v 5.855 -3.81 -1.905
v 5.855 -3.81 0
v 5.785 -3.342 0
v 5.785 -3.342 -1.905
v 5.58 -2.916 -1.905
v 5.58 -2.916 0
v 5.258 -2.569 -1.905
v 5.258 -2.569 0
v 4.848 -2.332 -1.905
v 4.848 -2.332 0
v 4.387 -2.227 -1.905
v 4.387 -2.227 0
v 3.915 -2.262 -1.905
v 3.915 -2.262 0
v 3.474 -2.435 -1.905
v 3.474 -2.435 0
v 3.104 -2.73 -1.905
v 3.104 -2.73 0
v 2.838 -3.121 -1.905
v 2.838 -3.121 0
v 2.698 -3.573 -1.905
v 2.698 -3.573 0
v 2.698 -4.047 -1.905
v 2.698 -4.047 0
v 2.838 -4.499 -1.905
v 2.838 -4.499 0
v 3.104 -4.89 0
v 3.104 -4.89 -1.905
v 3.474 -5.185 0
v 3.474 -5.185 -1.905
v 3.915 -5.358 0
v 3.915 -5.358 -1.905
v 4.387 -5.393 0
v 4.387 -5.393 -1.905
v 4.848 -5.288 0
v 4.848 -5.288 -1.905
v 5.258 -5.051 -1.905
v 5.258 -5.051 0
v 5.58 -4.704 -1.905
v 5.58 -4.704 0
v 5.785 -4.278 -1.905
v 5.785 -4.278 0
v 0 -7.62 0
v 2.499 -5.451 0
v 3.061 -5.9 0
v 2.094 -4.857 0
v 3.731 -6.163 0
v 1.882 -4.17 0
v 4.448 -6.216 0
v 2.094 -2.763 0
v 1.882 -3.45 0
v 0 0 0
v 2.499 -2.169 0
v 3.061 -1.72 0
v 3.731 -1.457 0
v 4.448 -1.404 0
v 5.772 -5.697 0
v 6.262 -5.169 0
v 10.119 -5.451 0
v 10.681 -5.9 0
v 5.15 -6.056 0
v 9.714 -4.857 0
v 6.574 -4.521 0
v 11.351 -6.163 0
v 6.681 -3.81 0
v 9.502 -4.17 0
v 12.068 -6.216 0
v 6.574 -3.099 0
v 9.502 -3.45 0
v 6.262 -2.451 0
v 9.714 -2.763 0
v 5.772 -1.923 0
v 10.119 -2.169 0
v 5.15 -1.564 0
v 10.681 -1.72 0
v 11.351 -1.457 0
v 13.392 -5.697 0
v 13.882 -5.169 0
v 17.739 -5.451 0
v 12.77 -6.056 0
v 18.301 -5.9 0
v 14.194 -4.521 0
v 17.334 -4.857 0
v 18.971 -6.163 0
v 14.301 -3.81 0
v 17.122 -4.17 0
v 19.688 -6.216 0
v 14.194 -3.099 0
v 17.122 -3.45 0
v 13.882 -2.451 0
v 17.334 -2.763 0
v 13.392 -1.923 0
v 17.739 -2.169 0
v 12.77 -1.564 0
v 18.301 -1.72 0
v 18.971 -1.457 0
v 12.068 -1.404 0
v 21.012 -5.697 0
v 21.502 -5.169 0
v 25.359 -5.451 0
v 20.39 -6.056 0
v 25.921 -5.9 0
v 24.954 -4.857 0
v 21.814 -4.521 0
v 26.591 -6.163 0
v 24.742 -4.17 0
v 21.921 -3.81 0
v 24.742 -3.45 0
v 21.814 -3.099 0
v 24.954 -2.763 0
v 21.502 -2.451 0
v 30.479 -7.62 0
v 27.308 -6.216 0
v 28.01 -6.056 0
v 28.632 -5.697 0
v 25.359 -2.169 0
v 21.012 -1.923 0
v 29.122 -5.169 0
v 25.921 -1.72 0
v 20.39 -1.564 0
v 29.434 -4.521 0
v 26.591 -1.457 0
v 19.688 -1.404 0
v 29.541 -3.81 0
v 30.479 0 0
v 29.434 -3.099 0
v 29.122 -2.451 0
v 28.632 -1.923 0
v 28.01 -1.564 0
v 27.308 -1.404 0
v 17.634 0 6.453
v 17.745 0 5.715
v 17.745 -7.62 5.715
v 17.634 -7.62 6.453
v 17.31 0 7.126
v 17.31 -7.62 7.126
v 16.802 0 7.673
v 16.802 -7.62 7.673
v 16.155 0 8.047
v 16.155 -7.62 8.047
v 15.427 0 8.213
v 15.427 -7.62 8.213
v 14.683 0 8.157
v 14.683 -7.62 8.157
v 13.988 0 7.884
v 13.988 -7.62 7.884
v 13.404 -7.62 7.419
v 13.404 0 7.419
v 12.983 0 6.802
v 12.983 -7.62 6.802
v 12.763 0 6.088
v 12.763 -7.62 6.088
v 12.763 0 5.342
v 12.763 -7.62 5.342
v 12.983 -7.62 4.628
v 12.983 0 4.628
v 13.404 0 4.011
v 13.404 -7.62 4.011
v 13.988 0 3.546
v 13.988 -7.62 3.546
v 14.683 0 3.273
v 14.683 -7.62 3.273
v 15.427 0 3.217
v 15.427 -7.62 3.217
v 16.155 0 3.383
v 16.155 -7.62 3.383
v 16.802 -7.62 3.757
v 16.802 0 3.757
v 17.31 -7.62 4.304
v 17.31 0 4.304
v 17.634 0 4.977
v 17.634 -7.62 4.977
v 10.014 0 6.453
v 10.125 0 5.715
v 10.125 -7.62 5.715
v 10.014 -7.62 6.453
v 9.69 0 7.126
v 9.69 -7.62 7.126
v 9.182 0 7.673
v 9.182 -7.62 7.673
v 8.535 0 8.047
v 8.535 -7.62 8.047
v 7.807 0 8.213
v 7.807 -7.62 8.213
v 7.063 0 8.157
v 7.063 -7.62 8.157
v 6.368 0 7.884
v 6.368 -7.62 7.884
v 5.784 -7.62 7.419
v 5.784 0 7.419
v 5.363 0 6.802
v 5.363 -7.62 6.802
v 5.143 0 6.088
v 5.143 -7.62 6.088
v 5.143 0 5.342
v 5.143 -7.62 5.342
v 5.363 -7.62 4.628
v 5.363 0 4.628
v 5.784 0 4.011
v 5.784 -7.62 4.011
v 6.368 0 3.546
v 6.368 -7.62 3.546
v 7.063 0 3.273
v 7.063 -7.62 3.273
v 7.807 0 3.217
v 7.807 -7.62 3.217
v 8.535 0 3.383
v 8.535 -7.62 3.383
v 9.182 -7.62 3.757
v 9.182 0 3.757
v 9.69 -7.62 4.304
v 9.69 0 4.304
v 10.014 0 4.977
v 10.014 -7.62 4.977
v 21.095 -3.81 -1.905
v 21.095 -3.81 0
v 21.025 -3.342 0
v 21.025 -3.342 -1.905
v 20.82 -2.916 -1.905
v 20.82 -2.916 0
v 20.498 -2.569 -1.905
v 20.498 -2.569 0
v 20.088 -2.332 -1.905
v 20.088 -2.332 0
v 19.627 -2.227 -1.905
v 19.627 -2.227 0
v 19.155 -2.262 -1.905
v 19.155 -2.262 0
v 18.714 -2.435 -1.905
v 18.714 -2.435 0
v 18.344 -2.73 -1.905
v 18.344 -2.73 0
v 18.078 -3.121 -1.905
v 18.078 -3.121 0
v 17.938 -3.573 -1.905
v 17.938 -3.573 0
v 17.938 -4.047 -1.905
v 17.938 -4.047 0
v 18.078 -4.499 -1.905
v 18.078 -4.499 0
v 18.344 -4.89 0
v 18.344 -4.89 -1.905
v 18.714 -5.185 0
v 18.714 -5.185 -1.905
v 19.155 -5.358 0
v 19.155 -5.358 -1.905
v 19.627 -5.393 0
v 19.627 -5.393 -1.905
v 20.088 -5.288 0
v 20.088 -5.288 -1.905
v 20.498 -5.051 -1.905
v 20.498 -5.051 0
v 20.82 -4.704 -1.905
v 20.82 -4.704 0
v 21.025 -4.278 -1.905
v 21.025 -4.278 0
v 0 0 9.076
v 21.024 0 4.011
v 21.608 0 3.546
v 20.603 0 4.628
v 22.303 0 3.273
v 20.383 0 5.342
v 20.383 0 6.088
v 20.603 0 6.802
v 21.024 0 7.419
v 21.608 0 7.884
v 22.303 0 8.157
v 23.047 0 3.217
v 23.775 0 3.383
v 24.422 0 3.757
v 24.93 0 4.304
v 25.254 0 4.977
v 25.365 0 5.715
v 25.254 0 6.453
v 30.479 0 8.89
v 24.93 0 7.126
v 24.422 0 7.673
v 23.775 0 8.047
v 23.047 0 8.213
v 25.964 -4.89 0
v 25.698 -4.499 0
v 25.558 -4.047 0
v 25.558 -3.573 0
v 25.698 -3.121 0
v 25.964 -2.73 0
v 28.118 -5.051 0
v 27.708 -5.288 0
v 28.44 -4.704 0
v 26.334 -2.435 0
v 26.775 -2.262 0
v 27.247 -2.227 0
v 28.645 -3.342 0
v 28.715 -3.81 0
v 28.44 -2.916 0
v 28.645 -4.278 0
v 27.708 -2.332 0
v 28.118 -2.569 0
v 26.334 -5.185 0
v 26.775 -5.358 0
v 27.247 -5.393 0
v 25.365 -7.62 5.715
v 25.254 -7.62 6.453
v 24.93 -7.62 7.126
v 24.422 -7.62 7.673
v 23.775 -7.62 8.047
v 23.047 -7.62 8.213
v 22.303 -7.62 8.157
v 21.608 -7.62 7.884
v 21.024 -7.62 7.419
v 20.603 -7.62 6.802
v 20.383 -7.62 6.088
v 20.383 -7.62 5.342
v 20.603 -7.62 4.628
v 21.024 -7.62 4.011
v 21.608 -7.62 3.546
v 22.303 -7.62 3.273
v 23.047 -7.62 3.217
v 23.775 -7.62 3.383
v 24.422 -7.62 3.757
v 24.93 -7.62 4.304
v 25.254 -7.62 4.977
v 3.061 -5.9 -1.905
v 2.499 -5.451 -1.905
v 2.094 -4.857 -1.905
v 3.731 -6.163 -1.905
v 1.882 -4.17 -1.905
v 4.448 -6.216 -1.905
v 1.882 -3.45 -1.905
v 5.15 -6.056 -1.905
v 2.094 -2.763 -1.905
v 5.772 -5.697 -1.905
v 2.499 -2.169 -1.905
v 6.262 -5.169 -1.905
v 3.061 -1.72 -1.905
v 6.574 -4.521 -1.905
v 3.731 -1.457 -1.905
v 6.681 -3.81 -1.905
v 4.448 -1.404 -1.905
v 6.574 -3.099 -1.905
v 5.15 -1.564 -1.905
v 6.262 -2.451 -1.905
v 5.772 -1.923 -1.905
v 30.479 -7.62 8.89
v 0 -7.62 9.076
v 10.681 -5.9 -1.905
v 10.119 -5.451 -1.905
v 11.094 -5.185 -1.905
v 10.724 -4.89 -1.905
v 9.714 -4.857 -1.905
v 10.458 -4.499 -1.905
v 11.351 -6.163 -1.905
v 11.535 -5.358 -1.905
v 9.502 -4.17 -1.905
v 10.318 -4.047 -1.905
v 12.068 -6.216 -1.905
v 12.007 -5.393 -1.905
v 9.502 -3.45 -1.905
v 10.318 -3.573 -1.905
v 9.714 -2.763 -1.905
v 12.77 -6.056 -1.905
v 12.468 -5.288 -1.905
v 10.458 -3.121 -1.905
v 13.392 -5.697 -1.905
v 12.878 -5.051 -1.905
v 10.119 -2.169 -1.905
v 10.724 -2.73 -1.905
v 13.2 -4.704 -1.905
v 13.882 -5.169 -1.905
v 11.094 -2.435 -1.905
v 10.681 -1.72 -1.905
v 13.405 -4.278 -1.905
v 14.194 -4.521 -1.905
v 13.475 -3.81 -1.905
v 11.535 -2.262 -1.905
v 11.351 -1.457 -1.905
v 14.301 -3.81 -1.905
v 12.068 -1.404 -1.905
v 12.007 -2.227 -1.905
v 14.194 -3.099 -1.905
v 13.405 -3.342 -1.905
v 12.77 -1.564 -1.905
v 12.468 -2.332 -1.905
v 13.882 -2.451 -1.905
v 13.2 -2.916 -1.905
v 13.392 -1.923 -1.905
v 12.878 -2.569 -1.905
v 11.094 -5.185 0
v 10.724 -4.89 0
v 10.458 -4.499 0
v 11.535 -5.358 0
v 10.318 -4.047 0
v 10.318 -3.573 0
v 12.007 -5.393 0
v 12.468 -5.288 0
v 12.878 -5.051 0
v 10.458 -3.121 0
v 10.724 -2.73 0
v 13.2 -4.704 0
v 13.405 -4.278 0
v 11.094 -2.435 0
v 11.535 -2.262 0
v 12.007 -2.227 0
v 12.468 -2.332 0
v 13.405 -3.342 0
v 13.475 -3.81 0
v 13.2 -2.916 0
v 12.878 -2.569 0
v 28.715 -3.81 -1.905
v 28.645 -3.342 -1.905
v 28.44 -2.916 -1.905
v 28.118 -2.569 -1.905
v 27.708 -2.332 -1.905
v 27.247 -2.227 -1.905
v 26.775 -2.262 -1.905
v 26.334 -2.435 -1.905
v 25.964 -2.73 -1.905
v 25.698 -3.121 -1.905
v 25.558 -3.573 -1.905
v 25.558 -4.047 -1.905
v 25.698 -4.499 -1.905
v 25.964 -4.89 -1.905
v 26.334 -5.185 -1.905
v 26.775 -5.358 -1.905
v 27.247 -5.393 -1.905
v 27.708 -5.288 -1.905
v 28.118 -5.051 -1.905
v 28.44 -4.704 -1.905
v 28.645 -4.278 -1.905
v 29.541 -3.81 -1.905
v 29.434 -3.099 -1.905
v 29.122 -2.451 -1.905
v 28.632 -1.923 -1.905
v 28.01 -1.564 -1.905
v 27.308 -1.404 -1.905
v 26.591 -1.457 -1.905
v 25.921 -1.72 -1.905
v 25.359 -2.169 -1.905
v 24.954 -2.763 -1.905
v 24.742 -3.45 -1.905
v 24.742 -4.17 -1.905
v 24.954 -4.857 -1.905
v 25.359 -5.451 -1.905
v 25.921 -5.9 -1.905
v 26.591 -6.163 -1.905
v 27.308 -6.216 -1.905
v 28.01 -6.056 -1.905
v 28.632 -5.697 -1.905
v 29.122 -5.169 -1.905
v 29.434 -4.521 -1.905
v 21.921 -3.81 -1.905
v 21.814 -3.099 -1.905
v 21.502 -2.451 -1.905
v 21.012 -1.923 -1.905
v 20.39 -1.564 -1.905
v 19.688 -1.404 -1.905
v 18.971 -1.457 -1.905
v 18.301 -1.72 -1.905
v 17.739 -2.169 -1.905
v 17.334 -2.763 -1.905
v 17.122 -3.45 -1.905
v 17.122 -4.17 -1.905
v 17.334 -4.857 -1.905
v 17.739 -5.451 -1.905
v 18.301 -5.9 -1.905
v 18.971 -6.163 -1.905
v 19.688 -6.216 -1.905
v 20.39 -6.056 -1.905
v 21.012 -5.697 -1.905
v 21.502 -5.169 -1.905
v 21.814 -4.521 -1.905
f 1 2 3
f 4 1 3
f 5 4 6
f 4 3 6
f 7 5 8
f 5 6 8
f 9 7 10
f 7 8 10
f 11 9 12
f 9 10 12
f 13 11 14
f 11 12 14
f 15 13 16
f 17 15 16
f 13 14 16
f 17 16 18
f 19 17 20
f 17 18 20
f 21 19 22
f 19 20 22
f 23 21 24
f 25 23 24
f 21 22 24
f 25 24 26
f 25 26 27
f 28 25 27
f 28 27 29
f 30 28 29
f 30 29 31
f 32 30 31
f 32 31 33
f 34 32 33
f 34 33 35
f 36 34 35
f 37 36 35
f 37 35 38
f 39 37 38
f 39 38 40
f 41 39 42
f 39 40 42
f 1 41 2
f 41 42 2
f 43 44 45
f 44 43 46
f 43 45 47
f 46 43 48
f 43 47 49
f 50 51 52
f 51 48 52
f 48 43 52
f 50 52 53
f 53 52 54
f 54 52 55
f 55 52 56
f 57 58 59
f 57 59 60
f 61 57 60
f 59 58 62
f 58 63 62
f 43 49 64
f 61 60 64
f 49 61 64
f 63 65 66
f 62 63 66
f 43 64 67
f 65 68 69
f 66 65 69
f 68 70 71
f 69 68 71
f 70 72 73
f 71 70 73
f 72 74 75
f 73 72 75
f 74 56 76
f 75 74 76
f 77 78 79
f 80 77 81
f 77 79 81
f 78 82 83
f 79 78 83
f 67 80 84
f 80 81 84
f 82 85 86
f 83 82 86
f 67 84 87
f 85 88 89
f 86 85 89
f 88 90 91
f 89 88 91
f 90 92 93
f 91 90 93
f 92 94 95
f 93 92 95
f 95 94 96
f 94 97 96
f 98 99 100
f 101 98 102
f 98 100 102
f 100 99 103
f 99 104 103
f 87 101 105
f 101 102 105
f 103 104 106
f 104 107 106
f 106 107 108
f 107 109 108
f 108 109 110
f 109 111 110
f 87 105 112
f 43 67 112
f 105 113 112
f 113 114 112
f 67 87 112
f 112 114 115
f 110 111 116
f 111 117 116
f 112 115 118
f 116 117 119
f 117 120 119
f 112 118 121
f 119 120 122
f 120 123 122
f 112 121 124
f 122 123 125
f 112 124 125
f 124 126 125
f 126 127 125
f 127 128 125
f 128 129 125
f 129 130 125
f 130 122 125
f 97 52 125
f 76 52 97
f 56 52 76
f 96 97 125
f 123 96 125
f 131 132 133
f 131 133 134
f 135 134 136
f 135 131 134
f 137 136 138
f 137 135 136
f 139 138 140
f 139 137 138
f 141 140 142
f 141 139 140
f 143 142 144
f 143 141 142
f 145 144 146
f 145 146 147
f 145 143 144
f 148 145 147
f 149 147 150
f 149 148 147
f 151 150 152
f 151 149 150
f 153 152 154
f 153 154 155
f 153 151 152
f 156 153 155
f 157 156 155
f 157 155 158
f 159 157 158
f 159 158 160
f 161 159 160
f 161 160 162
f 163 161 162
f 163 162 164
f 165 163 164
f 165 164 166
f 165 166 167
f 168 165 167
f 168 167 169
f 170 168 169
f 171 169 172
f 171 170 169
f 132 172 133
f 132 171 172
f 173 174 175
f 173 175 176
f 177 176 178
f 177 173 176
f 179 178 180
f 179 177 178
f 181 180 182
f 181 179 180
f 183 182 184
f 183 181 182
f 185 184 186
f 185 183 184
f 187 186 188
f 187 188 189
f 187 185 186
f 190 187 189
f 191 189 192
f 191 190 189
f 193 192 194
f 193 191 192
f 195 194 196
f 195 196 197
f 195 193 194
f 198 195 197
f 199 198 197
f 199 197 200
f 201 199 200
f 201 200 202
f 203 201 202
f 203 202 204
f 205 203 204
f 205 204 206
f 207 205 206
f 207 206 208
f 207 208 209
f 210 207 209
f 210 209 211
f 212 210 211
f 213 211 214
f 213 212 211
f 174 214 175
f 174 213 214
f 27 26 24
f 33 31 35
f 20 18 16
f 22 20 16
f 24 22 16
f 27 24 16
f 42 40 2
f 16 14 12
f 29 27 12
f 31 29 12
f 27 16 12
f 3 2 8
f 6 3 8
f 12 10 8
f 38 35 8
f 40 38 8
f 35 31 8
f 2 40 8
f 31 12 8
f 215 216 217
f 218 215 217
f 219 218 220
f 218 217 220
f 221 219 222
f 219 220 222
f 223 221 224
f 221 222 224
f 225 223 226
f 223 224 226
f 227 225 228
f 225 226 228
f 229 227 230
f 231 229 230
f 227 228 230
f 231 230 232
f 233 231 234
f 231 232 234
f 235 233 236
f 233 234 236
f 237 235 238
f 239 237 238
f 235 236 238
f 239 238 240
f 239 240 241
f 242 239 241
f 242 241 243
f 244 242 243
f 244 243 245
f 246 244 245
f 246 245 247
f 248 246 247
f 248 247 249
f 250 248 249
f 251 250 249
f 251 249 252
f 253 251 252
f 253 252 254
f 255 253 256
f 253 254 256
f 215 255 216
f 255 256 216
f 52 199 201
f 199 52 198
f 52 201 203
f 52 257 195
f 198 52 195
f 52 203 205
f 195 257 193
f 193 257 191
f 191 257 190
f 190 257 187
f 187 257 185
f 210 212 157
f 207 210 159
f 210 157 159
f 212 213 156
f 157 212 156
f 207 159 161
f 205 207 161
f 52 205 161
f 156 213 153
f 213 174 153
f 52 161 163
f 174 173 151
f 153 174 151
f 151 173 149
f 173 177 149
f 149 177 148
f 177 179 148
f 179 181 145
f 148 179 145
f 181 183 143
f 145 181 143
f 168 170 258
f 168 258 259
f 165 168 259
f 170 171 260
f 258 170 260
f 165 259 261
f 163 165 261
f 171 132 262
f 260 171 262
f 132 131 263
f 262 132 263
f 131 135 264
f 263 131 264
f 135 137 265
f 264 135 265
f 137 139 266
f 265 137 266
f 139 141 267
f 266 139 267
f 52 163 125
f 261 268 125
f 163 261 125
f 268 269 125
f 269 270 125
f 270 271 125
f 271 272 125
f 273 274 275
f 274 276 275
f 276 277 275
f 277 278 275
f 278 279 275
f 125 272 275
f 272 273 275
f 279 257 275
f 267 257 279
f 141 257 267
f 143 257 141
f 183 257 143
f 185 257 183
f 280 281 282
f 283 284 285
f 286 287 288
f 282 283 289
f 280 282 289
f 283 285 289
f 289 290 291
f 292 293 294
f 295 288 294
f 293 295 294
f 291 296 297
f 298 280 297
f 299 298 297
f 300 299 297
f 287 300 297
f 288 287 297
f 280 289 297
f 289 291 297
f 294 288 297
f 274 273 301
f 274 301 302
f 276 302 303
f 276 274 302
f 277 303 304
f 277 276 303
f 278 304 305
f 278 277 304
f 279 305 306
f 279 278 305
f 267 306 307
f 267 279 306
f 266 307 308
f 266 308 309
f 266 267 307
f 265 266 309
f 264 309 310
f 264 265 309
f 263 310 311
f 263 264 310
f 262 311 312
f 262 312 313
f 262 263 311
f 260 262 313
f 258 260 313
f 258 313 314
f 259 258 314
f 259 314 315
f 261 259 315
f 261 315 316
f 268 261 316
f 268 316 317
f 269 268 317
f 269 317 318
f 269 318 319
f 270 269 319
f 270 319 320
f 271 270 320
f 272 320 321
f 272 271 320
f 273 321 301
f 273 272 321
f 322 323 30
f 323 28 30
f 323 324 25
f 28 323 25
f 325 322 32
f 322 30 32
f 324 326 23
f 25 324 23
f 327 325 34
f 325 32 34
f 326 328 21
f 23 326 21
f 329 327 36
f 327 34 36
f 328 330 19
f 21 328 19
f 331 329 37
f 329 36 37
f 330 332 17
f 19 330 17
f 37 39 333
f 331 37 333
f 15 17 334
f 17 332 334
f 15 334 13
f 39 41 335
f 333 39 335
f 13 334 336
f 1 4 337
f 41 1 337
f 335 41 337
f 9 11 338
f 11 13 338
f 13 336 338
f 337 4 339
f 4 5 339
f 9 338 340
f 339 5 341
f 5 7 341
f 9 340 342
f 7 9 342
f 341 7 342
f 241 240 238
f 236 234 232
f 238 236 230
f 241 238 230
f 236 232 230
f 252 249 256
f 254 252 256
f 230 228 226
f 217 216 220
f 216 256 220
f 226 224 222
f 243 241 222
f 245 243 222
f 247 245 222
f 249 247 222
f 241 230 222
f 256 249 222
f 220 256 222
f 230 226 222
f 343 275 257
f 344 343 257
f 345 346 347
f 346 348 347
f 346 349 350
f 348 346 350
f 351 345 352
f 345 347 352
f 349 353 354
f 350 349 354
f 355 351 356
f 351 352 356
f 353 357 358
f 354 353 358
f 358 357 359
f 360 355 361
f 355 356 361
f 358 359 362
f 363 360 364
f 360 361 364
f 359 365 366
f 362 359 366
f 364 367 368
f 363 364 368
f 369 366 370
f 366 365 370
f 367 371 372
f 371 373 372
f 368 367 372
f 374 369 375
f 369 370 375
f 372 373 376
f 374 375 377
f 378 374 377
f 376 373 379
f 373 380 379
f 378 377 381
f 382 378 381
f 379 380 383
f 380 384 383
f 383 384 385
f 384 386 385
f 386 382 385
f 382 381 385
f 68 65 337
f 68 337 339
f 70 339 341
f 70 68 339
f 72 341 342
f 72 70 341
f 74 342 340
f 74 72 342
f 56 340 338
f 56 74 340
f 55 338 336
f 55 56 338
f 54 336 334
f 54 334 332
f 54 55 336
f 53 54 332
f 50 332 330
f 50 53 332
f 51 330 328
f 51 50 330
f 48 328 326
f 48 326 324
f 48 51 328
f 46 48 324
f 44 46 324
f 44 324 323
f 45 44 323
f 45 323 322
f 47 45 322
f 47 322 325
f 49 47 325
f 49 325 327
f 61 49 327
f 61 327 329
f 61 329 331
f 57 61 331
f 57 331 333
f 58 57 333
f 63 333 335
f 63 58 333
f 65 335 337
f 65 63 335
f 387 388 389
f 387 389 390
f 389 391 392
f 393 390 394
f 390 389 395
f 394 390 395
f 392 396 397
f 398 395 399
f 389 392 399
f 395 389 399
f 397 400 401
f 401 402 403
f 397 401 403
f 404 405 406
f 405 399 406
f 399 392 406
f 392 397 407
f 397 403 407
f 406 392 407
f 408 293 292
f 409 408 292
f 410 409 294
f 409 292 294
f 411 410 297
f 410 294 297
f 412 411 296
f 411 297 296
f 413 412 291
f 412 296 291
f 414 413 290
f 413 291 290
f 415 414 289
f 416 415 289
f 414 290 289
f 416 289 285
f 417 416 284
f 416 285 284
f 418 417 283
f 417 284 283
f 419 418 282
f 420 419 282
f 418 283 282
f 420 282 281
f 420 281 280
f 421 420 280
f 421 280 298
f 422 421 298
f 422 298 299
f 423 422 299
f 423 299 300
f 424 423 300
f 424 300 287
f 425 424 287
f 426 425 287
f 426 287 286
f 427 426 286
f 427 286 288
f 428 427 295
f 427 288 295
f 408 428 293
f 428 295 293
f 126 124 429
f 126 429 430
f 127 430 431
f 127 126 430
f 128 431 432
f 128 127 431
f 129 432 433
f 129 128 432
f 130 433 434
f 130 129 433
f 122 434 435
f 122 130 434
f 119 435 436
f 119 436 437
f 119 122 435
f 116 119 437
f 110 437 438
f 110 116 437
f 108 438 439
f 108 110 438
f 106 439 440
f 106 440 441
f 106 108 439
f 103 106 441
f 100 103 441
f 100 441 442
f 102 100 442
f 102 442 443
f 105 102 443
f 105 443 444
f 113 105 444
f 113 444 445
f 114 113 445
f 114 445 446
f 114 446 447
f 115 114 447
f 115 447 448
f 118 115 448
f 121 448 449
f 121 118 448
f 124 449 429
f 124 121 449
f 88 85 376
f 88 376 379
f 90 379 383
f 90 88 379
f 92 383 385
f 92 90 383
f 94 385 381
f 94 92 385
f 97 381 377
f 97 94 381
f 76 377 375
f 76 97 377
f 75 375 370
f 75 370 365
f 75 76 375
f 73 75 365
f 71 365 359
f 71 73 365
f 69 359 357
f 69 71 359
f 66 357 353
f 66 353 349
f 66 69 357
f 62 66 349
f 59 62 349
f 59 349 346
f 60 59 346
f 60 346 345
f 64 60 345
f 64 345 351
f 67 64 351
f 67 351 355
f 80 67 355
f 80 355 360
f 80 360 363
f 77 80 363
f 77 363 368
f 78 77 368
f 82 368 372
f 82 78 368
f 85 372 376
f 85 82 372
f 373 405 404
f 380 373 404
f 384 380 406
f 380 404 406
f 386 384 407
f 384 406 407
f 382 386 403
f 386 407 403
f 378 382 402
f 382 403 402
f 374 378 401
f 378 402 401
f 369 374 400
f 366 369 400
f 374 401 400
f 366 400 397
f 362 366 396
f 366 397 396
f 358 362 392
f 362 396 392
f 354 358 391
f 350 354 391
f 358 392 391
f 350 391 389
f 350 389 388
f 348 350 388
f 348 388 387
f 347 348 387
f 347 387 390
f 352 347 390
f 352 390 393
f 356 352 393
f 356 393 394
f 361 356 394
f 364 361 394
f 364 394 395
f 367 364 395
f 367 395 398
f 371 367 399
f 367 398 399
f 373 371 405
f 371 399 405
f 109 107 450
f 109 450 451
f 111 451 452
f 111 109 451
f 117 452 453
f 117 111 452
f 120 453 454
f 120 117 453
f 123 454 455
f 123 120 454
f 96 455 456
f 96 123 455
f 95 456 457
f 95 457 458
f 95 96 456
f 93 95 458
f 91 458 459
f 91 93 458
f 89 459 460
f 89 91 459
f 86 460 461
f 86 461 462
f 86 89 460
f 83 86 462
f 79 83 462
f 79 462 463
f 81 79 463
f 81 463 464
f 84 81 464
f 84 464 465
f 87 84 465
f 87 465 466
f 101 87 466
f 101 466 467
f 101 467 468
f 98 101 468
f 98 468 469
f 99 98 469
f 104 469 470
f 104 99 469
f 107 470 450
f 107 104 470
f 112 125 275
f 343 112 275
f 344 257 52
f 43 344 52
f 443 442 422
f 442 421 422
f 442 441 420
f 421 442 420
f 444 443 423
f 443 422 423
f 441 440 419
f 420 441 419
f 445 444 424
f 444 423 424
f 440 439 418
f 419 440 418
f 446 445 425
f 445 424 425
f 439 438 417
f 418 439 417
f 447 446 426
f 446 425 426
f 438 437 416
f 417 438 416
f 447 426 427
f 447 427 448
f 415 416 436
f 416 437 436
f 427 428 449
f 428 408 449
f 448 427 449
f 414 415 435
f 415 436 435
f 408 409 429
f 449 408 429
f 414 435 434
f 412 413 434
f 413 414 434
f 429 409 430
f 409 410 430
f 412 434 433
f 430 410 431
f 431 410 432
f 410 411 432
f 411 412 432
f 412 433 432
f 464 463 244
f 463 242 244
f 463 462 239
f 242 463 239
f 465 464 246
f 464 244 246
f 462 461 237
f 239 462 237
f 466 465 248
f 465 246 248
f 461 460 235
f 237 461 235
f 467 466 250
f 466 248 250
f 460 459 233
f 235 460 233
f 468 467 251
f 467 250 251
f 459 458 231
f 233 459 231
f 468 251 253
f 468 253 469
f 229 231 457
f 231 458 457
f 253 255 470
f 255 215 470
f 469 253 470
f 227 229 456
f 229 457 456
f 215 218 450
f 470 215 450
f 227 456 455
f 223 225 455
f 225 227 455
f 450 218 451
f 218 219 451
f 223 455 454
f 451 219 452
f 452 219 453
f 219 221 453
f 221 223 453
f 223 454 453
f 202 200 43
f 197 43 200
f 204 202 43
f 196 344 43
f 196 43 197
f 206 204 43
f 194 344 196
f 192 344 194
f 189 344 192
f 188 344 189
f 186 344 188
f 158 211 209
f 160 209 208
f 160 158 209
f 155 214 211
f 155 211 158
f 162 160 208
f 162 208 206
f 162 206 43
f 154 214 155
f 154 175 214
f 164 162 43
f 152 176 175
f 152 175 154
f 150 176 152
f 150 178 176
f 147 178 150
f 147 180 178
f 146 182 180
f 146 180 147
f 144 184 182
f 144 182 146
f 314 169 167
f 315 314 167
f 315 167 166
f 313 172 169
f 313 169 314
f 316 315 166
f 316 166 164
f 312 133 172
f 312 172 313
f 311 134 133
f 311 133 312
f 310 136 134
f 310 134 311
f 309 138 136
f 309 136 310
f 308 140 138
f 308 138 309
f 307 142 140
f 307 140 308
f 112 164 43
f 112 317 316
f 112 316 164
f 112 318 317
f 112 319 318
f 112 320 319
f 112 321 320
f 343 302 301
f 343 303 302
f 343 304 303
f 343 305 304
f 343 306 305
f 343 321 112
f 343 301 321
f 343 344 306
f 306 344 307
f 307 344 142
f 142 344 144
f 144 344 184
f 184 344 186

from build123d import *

# Parameters (mm, degrees)
F0_R     = 2.919268
F0_R_2   = 2.504925
F1_DEPTH = 7.62
F2_R     = 2.413
F2_R_2   = 1.5875
F3_DEPTH = 1.905


with BuildPart() as f1:
    # F0 (on Front) → F1 (new body)
    with BuildSketch(Plane.XZ):
        Polygon((30.479431, 8.89), (0, 9.076191), (0, 0), (30.479431, 0), align=None)
        with Locations((7.62, 5.715)):
            Circle(F0_R, mode=Mode.SUBTRACT)
        with Locations((15.24, 5.715)):
            Circle(F0_R, mode=Mode.SUBTRACT)
        with Locations((22.86, 5.715)):
            Circle(F0_R, mode=Mode.SUBTRACT)
        with Locations((15.24, 5.715)):
            Circle(F0_R)
        with Locations((15.24, 5.715)):
            Circle(F0_R_2, mode=Mode.SUBTRACT)
        with Locations((22.86, 5.715)):
            Circle(F0_R)
        with Locations((22.86, 5.715)):
            Circle(F0_R_2, mode=Mode.SUBTRACT)
        with Locations((7.62, 5.715)):
            Circle(F0_R)
        with Locations((7.62, 5.715)):
            Circle(F0_R_2, mode=Mode.SUBTRACT)
    extrude(amount=F1_DEPTH)

    # F2 (on Top) → F3 (join)
    with BuildSketch(Plane.XY):
        with Locations((4.267945, -3.81)):
            Circle(F2_R)
        with Locations((4.267945, -3.81)):
            Circle(F2_R_2, mode=Mode.SUBTRACT)
        with Locations((11.887945, -3.81)):
            Circle(F2_R)
        with Locations((11.887945, -3.81)):
            Circle(F2_R_2, mode=Mode.SUBTRACT)
        with Locations((19.507945, -3.81)):
            Circle(F2_R)
        with Locations((19.507945, -3.81)):
            Circle(F2_R_2, mode=Mode.SUBTRACT)
        with Locations((27.127945, -3.81)):
            Circle(F2_R)
        with Locations((27.127945, -3.81)):
            Circle(F2_R_2, mode=Mode.SUBTRACT)
    extrude(amount=-F3_DEPTH)


solid = f1.part
